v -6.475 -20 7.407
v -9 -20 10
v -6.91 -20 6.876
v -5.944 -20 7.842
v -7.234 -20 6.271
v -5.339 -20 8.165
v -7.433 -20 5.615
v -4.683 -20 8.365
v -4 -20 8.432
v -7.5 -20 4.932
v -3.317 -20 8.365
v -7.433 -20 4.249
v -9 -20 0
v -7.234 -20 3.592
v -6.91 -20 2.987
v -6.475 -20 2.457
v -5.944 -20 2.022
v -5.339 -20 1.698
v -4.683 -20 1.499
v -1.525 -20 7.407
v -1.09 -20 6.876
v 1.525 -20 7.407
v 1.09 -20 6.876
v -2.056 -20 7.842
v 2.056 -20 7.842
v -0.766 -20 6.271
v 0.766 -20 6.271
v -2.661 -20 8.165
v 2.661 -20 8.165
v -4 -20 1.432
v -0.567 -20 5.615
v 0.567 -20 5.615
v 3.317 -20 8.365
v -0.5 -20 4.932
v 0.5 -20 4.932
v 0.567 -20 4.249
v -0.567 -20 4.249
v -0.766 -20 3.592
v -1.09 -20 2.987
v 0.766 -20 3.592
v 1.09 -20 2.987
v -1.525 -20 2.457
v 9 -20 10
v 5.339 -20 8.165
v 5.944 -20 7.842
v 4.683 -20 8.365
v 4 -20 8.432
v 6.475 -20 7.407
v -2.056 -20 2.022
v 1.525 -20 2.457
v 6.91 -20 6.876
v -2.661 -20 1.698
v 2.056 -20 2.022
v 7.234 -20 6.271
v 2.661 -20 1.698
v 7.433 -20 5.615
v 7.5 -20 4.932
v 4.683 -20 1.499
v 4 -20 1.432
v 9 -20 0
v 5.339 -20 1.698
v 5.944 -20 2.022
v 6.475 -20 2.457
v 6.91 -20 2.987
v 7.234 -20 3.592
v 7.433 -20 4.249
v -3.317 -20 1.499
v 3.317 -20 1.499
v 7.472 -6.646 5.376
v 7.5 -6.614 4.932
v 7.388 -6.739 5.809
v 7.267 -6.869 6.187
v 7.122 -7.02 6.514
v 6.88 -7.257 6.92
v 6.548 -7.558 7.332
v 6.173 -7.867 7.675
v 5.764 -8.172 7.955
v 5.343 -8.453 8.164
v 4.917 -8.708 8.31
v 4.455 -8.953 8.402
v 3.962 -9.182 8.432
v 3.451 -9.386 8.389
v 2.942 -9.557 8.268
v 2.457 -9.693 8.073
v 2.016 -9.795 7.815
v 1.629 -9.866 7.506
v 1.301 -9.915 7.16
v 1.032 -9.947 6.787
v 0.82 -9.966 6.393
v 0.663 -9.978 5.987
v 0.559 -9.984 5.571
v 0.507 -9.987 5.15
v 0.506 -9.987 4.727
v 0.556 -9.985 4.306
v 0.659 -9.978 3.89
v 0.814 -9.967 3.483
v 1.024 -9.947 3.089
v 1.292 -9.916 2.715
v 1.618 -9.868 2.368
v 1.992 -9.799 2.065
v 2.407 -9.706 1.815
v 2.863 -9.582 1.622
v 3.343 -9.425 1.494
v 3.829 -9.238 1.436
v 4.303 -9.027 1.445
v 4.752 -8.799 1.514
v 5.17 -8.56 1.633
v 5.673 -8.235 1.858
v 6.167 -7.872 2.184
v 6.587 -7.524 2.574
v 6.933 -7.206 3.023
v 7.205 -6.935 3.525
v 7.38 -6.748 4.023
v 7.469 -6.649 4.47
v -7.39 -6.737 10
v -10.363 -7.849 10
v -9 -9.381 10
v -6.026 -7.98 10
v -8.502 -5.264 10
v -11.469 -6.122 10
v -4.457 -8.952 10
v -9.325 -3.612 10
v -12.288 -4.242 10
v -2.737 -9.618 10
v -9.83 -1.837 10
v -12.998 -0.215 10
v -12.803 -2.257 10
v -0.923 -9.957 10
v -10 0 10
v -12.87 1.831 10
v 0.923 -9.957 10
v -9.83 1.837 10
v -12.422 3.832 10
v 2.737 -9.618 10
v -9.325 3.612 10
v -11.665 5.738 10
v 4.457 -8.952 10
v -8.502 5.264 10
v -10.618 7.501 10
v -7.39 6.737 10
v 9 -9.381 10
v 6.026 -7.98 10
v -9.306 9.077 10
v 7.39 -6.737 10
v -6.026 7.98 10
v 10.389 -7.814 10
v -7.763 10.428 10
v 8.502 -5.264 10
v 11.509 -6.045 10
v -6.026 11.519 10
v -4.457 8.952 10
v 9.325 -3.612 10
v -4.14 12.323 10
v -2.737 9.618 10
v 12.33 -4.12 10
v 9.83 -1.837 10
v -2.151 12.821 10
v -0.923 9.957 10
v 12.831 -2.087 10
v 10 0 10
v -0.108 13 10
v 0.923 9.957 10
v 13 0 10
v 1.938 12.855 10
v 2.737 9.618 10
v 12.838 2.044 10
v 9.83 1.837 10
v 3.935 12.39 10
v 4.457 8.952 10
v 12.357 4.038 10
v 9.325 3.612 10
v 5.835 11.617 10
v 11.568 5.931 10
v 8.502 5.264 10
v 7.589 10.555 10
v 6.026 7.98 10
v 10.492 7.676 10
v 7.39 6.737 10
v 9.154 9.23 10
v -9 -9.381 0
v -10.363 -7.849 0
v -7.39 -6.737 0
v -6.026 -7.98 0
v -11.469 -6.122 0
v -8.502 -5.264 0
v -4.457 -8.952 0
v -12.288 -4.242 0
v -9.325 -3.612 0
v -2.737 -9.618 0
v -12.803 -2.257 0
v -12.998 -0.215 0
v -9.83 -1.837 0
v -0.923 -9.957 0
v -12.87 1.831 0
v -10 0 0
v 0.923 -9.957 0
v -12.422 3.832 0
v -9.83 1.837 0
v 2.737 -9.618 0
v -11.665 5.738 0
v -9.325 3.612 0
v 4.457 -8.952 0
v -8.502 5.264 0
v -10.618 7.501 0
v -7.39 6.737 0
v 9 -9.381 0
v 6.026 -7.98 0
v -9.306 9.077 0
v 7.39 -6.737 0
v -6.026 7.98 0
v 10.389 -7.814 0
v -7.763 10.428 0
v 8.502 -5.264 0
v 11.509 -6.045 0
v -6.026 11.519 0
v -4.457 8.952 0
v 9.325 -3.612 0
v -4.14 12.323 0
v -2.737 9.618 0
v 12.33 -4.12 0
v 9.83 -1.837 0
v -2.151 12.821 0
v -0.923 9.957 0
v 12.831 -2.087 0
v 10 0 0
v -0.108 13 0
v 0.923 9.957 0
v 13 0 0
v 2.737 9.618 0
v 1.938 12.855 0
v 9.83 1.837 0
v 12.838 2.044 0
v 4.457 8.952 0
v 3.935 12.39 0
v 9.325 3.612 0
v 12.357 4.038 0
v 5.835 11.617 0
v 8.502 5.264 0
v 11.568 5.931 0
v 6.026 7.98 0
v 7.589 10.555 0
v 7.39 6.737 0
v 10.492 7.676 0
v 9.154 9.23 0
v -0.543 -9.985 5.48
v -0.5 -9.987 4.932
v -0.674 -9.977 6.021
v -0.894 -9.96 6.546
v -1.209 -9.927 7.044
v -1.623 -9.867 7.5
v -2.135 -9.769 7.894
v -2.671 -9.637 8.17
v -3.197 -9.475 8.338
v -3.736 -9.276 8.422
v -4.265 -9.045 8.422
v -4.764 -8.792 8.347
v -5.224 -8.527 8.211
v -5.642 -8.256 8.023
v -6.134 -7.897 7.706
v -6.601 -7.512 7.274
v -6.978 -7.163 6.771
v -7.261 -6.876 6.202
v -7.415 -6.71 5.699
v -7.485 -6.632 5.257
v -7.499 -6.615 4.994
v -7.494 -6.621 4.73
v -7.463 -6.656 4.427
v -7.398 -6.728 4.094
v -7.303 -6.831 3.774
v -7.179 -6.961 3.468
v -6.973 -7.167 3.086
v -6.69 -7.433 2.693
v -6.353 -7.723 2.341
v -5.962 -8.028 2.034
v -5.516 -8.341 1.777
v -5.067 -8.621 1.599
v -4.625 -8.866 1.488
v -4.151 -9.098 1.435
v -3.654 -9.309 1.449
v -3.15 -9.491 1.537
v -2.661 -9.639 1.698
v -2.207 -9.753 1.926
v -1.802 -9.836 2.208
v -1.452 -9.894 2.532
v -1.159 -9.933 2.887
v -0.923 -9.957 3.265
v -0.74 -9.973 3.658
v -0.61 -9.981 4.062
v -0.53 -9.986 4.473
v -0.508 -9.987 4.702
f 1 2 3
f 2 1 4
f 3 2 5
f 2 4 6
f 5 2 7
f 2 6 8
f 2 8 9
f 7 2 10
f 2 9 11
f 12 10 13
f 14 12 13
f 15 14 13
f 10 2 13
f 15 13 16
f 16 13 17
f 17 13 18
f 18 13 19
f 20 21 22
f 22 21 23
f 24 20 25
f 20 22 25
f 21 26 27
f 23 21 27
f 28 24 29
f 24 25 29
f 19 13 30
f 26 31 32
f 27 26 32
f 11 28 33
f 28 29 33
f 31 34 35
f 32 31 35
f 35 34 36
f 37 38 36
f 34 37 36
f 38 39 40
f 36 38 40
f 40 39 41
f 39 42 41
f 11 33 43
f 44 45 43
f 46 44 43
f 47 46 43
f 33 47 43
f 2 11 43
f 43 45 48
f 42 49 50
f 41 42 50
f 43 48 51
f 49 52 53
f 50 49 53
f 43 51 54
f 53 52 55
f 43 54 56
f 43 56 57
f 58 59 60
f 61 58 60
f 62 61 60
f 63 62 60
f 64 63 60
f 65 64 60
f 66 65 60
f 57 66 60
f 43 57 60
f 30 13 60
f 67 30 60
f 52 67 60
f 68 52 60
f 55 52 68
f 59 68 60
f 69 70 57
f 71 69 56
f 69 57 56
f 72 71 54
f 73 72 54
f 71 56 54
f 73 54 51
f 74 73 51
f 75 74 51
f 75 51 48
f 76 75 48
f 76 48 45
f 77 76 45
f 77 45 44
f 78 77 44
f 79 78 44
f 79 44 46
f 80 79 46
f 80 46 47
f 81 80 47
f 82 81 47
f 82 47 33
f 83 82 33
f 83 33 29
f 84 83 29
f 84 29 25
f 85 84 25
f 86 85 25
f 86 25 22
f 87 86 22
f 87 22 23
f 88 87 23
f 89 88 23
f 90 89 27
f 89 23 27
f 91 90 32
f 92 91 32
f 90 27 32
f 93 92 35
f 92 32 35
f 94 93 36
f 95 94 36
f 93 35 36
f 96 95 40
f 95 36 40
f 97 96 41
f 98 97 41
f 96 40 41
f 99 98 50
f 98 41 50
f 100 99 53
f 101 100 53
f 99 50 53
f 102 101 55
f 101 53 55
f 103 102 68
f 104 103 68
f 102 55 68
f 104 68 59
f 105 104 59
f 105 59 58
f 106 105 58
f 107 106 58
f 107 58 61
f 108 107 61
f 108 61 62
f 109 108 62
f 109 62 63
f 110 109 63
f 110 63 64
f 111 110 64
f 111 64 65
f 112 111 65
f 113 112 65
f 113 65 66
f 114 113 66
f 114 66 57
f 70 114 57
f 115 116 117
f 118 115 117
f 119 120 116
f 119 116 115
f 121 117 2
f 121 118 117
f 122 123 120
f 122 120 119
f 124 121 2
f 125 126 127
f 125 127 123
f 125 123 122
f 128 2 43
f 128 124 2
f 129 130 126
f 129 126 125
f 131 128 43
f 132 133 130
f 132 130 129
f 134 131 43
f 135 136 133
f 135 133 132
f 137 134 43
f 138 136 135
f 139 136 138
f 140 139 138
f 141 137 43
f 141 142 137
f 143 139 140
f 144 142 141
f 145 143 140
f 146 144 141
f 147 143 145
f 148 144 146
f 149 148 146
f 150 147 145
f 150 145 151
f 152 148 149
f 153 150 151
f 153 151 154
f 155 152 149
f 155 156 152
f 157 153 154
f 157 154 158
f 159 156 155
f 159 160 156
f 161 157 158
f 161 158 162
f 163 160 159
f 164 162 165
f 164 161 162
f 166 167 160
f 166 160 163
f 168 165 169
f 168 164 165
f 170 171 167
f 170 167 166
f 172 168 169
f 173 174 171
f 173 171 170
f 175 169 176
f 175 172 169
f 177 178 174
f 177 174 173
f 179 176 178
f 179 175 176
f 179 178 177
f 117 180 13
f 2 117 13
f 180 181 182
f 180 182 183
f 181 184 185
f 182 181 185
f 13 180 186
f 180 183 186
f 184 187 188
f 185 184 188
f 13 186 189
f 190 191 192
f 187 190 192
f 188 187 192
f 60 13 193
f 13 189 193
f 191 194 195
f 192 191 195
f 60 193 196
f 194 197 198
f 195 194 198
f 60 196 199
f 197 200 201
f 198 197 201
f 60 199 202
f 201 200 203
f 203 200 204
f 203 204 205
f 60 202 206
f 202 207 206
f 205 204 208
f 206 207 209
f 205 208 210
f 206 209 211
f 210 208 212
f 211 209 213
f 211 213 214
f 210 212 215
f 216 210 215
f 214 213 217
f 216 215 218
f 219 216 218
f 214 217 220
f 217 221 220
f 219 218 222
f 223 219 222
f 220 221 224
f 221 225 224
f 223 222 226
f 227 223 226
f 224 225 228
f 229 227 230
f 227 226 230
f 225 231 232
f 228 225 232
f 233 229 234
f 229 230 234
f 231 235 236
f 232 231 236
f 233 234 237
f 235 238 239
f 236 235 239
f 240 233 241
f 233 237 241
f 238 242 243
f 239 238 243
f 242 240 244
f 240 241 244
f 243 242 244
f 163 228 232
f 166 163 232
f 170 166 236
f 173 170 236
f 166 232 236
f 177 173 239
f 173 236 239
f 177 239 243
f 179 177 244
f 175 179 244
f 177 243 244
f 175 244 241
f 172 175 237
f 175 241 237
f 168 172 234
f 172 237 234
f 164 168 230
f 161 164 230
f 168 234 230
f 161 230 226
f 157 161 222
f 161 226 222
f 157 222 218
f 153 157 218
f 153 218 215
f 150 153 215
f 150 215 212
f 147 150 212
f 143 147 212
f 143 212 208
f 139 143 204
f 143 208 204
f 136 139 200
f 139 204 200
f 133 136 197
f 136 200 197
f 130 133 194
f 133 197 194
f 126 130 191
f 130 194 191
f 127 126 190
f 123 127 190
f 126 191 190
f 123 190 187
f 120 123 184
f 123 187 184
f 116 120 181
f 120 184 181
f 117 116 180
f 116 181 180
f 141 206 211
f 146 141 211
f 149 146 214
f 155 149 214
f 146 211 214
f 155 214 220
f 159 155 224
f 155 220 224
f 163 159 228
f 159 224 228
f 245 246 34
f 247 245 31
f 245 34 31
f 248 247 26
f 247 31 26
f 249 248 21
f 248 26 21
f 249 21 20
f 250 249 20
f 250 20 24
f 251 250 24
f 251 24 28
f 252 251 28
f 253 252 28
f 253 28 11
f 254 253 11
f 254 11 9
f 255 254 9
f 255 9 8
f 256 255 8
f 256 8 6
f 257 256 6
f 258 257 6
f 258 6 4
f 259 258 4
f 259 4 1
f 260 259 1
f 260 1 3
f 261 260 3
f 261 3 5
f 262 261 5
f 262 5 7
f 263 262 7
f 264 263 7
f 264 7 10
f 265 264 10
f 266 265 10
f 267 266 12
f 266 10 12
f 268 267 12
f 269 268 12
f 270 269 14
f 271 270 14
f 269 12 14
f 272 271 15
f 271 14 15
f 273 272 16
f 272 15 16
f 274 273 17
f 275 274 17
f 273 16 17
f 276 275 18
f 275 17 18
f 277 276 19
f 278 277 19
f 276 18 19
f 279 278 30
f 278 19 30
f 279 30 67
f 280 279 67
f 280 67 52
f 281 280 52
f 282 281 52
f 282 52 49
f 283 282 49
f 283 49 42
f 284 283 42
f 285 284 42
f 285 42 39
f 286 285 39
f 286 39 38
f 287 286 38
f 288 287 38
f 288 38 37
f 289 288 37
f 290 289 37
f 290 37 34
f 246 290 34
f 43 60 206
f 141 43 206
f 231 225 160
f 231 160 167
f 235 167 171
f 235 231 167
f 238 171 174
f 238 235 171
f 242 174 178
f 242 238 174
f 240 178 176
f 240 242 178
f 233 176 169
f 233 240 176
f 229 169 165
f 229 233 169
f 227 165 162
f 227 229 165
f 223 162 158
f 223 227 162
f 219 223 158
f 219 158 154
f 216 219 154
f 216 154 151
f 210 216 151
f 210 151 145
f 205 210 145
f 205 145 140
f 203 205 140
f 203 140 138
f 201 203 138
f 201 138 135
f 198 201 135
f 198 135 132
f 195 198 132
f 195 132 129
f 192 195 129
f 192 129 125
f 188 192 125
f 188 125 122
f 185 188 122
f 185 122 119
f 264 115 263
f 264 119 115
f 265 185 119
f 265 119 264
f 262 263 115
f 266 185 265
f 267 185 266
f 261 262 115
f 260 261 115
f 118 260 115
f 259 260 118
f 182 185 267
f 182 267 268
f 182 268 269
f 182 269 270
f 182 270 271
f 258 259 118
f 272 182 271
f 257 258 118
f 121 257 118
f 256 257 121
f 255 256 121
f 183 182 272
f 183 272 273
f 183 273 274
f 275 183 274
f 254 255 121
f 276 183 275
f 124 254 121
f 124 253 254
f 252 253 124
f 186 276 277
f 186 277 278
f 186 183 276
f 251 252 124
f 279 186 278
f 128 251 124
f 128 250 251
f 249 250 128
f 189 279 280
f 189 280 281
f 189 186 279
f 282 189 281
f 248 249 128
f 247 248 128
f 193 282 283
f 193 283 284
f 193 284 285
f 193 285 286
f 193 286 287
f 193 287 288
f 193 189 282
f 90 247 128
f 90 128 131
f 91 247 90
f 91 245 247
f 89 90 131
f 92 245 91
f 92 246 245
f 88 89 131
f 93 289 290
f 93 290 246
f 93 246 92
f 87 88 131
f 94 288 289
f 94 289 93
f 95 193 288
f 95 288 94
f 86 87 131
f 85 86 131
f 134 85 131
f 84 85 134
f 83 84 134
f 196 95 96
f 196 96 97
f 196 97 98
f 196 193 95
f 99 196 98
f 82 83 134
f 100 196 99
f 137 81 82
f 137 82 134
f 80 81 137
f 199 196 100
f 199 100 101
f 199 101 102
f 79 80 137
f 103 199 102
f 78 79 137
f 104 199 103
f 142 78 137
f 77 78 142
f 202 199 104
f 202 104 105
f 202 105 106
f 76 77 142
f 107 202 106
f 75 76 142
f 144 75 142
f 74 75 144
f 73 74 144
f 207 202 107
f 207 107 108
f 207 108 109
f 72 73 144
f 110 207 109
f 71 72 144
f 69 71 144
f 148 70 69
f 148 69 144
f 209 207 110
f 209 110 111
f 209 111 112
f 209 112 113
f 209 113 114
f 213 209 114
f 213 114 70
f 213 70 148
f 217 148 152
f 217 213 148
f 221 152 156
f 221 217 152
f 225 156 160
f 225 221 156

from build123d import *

# Parameters (mm, degrees)
F0_R     = 10
F1_DEPTH = 10
F2_R     = 3.5
F3_DEPTH = 13.386621823


with BuildPart() as f1:
    # F0 (on Top) → F1 (new body)
    with BuildSketch(Plane.XY):
        with BuildLine():
            ThreePointArc((9, -9.3808315196), (11.9582607431, -5.0990195136), (13, 0))
            ThreePointArc((13, 0), (-5.0990195136, 11.9582607431), (-9, -9.3808315196))
            ThreePointArc((-9, -9.3808315196), (0, -13), (9, -9.3808315196))
        make_face()
        Circle(F0_R, mode=Mode.SUBTRACT)
        with BuildLine():
            ThreePointArc((9, -9.3808315196), (0, -13), (-9, -9.3808315196))
            Line((-9, -9.3808315196), (-9, -20))
            Line((-9, -20), (9, -20))
            Line((9, -20), (9, -9.3808315196))
        make_face()
    extrude(amount=F1_DEPTH)

    # F2 (on face) → F3 (cut, through all)
    with BuildSketch(Plane.XZ.offset(20)):
        with Locations((-4, 4.9318415113)):
            Circle(F2_R)
        with Locations((4, 4.9318415113)):
            Circle(F2_R)
    extrude(amount=-F3_DEPTH, mode=Mode.SUBTRACT)


solid = f1.part
